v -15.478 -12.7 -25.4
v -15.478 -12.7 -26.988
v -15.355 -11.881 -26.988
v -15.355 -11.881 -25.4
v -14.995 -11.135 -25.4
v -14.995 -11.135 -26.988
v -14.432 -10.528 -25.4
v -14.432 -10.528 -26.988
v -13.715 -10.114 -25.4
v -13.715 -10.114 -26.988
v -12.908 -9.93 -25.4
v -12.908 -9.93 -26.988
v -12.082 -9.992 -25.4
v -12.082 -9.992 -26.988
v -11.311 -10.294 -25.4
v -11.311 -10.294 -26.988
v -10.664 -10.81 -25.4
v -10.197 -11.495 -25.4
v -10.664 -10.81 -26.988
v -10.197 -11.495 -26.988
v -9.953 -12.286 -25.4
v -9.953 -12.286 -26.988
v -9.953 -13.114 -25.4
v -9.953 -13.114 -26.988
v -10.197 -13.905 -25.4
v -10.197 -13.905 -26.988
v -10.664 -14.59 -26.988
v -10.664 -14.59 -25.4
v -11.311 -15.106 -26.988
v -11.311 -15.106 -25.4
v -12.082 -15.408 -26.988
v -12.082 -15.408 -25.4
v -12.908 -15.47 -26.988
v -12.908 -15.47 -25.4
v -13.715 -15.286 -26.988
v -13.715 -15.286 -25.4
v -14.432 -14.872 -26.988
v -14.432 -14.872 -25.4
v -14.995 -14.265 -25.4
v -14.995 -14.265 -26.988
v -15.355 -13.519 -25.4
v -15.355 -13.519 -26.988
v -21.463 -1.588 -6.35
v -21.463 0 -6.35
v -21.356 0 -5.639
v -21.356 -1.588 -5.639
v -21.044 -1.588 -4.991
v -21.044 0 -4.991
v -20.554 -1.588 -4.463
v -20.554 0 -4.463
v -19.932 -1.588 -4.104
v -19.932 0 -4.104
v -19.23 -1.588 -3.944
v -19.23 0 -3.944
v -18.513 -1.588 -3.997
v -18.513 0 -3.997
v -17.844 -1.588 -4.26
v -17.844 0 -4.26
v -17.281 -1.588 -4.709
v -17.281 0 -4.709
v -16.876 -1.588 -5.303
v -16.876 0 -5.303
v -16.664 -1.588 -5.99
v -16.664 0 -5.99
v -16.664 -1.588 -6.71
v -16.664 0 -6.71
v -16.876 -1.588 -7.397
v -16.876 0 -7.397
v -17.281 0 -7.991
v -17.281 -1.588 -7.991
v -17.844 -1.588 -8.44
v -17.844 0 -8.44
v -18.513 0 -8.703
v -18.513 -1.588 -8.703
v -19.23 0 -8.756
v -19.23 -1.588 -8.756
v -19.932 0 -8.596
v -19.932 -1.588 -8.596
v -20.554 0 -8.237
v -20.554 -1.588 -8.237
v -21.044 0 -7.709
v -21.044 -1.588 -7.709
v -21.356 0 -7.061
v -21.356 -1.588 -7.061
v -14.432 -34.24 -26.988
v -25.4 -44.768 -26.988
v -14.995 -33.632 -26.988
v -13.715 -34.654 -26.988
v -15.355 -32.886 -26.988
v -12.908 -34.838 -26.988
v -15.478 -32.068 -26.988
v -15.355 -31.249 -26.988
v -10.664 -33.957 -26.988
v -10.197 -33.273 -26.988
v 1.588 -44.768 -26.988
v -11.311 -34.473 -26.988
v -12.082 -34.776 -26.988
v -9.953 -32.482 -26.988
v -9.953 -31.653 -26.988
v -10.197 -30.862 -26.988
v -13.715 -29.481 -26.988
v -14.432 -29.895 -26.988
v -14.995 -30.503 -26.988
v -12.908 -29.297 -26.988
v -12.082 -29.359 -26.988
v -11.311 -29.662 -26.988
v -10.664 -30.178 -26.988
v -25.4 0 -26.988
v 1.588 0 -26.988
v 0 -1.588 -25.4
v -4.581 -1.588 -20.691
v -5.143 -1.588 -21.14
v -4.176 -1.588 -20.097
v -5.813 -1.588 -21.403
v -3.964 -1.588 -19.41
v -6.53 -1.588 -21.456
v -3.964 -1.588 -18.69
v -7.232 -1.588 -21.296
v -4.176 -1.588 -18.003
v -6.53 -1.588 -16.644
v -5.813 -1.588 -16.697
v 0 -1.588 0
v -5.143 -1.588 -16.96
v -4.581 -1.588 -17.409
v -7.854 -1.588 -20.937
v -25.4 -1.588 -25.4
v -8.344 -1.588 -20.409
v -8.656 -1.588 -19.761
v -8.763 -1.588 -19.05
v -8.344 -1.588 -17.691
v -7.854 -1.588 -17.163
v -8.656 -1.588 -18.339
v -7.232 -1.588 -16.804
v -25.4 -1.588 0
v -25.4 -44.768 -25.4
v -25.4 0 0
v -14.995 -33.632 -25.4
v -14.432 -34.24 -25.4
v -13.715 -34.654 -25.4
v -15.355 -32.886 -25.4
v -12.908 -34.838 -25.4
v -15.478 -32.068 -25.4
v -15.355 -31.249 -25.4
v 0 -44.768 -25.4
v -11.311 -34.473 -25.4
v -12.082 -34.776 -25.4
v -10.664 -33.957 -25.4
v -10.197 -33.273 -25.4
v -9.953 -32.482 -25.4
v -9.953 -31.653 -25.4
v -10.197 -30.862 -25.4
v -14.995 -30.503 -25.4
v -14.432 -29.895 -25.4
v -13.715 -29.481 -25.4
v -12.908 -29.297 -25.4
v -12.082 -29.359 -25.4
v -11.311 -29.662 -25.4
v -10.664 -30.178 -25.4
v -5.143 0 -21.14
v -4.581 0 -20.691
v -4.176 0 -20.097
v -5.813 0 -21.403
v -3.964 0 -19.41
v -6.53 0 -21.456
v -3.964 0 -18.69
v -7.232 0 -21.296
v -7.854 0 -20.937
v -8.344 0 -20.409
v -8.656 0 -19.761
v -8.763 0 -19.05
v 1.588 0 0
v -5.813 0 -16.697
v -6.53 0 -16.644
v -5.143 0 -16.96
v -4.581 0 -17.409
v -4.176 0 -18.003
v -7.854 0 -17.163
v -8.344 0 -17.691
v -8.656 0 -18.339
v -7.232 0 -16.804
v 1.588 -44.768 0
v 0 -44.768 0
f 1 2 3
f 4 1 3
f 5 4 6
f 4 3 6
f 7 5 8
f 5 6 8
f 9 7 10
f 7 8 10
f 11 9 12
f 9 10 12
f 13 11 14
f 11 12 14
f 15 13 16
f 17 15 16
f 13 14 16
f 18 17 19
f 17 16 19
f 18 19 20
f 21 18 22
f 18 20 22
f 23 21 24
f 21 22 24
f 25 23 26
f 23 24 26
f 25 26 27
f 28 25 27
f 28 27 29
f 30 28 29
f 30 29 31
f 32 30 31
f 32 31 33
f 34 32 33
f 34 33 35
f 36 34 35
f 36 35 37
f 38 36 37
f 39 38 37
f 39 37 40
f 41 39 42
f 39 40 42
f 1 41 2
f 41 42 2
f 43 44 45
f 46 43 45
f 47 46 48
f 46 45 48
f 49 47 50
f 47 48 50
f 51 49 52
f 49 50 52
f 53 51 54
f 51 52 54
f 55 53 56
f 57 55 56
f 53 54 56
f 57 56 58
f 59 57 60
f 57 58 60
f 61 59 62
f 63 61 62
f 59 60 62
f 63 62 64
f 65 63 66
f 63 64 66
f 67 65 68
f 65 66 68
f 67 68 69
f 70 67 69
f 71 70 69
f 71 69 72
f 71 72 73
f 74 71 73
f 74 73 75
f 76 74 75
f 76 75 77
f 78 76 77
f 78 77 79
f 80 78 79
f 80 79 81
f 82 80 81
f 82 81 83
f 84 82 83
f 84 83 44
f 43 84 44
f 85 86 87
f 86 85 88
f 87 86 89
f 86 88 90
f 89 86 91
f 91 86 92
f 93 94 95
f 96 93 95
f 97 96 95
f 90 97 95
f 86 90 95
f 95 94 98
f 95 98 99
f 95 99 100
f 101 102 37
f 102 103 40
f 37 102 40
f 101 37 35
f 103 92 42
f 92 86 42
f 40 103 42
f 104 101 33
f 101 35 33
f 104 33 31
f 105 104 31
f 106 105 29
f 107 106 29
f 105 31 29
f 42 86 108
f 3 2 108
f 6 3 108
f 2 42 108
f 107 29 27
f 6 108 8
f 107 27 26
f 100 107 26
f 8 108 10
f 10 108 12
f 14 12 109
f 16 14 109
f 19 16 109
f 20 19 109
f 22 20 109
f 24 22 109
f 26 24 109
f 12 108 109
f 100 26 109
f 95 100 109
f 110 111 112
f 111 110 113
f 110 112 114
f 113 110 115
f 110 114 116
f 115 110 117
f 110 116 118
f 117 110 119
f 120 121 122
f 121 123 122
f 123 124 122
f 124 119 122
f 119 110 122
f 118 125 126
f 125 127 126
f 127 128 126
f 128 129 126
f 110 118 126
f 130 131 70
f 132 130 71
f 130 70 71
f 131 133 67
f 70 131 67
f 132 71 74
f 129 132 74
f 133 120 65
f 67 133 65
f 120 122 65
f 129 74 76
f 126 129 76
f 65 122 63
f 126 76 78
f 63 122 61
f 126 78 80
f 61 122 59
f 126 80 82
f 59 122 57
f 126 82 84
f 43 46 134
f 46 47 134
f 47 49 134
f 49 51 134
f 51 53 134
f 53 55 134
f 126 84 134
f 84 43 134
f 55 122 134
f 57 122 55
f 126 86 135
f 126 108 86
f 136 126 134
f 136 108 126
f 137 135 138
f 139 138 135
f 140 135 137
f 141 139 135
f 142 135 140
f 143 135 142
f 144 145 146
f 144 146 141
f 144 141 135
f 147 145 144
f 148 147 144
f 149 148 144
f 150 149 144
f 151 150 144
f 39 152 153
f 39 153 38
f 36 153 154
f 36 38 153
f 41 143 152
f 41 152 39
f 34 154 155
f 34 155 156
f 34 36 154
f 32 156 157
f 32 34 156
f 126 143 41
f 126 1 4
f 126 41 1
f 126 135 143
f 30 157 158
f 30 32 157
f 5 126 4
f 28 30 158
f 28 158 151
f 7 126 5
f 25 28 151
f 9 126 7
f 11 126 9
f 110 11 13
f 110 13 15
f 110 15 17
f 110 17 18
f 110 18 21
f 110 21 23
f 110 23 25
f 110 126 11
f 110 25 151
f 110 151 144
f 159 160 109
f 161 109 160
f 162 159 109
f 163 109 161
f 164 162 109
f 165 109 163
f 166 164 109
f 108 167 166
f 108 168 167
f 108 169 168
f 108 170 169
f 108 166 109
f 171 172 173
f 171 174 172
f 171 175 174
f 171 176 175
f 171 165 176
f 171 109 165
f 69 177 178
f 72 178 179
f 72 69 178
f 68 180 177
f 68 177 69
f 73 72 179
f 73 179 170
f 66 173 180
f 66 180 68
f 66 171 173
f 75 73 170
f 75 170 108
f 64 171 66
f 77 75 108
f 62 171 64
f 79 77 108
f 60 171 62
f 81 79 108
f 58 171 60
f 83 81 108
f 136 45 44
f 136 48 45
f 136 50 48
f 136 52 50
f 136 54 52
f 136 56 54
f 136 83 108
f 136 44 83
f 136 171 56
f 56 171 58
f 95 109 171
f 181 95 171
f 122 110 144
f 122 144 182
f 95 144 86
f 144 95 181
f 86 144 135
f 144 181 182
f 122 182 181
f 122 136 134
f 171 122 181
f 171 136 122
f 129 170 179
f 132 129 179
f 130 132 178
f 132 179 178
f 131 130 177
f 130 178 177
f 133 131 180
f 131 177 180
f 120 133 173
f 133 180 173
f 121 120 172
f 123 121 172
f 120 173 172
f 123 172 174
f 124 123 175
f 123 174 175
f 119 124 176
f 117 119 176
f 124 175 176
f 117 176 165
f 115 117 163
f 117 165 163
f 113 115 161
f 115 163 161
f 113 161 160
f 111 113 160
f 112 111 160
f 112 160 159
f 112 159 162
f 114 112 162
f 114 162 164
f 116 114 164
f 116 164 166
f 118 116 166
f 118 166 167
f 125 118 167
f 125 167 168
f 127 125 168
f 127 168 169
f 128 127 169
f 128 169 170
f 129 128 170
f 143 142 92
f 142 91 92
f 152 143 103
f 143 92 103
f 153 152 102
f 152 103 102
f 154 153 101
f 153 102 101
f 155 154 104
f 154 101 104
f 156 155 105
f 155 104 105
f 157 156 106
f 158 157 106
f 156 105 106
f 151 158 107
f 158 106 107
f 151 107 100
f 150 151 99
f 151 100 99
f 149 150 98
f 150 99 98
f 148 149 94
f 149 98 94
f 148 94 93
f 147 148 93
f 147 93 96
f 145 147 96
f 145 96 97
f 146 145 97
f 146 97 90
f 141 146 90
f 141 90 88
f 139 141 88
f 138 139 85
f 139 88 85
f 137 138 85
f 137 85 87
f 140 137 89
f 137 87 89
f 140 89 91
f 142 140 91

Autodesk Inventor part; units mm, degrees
ref_plane "YZ Plane" through (0, 0, 0) normal (1, 0, 0) x (0, 1, 0)
ref_plane "XZ Plane" through (0, 0, 0) normal (0, 1, 0) x (-1, 0, 0)
ref_plane "XY Plane" through (0, 0, 0) normal (0, 0, 1) x (1, 0, 0)
sketch "Sketch1" plane through (0, 0, 0) normal (0, 1, 0) x (-1, 0, 0)
  line L0 (0, 0) -> (25.4, 0)
  line L1 (25.4, 0) -> (25.4, -25.4)
  line L2 (25.4, -25.4) -> (0, -25.4)
  line L3 (0, -25.4) -> (0, 0)
  line L4 (-1.5875, 1.5875) -> (26.9875, 1.5875)
  line L5 (26.9875, 1.5875) -> (26.9875, -26.9875)
  line L6 (26.9875, -26.9875) -> (-1.5875, -26.9875)
  line L7 (-1.5875, -26.9875) -> (-1.5875, 1.5875)
  circle A0 centre (19.05, -6.35) radius 2.413
  line L8 (0, 0) -> (25.4, -25.4) construction
  circle A1 centre (6.35, -19.05) radius 2.413
  dimension "d0" = 25.4
  dimension "d1" = 25.4
  dimension "d2" = 1.5875
  dimension "d3" = 4.826
  dimension "d4" = 6.35
  dimension "d5" = 6.35
extrude "Extrusion1" add sketch "Sketch1" against normal blind 1.5875 contours L0 L1 L2 L3 | L4 L5 L6 L7
extrude "Extrusion2" add sketch "Sketch1" against normal blind 44.7675 contours L4 L5 L6 L7
sketch "Sketch2" plane through (1.5875, 0, -26.9875) normal (0, 0, -1) x (-1, 0, 0)
  line L0 (0, 0) -> (28.575, 0) construction
  line L1 (14.2875, 0) -> (14.2875, -44.7675) construction
  line L2 (1.5875, -44.7675) -> (26.9875, -44.7675) construction
  circle A0 centre (14.2875, -12.7) radius 2.7781
  circle A1 centre (14.2875, -32.0675) radius 2.7781
  point P0 (1.5875, 0)
  dimension "d10" = 5.5563
  dimension "d11" = 12.7
  dimension "d12" = 12.7
extrude "Extrusion3" cut sketch "Sketch2" against normal blind 44.7675
sketch "Sketch3" plane through (-26.9875, 0, -26.9875) normal (-1, 0, 0) x (0, 0, 1)
  line L0 (0, 0) -> (28.575, 0) projected
  line L1 (0, 0) -> (0, -44.7675) projected
  line L2 (28.575, -44.7675) -> (0, -44.7675) projected
  line L3 (28.575, 0) -> (28.575, -44.7675) projected
  point P0 (26.9875, 0)
sketch "Sketch4" plane through (-26.9875, 0, 1.5875) normal (0, 0, 1) x (1, 0, 0)
  circle A0 centre (14.2875, -32.0675) radius 2.7781 projected
  circle A1 centre (14.2875, -12.7) radius 2.7781 projected
  line L0 (0, 0) -> (28.575, 0) projected
  line L1 (0, 0) -> (0, -44.7675) projected
  line L2 (28.575, -44.7675) -> (0, -44.7675) projected
  line L3 (28.575, 0) -> (28.575, -44.7675) projected
  point P0 (26.9875, 0)
extrude "Extrusion4" cut sketch "Sketch3" against normal blind 1.5875
extrude "Extrusion5" cut sketch "Sketch4" against normal blind 1.5875
properties part number "FlipperTensionerBlock1Tool"
